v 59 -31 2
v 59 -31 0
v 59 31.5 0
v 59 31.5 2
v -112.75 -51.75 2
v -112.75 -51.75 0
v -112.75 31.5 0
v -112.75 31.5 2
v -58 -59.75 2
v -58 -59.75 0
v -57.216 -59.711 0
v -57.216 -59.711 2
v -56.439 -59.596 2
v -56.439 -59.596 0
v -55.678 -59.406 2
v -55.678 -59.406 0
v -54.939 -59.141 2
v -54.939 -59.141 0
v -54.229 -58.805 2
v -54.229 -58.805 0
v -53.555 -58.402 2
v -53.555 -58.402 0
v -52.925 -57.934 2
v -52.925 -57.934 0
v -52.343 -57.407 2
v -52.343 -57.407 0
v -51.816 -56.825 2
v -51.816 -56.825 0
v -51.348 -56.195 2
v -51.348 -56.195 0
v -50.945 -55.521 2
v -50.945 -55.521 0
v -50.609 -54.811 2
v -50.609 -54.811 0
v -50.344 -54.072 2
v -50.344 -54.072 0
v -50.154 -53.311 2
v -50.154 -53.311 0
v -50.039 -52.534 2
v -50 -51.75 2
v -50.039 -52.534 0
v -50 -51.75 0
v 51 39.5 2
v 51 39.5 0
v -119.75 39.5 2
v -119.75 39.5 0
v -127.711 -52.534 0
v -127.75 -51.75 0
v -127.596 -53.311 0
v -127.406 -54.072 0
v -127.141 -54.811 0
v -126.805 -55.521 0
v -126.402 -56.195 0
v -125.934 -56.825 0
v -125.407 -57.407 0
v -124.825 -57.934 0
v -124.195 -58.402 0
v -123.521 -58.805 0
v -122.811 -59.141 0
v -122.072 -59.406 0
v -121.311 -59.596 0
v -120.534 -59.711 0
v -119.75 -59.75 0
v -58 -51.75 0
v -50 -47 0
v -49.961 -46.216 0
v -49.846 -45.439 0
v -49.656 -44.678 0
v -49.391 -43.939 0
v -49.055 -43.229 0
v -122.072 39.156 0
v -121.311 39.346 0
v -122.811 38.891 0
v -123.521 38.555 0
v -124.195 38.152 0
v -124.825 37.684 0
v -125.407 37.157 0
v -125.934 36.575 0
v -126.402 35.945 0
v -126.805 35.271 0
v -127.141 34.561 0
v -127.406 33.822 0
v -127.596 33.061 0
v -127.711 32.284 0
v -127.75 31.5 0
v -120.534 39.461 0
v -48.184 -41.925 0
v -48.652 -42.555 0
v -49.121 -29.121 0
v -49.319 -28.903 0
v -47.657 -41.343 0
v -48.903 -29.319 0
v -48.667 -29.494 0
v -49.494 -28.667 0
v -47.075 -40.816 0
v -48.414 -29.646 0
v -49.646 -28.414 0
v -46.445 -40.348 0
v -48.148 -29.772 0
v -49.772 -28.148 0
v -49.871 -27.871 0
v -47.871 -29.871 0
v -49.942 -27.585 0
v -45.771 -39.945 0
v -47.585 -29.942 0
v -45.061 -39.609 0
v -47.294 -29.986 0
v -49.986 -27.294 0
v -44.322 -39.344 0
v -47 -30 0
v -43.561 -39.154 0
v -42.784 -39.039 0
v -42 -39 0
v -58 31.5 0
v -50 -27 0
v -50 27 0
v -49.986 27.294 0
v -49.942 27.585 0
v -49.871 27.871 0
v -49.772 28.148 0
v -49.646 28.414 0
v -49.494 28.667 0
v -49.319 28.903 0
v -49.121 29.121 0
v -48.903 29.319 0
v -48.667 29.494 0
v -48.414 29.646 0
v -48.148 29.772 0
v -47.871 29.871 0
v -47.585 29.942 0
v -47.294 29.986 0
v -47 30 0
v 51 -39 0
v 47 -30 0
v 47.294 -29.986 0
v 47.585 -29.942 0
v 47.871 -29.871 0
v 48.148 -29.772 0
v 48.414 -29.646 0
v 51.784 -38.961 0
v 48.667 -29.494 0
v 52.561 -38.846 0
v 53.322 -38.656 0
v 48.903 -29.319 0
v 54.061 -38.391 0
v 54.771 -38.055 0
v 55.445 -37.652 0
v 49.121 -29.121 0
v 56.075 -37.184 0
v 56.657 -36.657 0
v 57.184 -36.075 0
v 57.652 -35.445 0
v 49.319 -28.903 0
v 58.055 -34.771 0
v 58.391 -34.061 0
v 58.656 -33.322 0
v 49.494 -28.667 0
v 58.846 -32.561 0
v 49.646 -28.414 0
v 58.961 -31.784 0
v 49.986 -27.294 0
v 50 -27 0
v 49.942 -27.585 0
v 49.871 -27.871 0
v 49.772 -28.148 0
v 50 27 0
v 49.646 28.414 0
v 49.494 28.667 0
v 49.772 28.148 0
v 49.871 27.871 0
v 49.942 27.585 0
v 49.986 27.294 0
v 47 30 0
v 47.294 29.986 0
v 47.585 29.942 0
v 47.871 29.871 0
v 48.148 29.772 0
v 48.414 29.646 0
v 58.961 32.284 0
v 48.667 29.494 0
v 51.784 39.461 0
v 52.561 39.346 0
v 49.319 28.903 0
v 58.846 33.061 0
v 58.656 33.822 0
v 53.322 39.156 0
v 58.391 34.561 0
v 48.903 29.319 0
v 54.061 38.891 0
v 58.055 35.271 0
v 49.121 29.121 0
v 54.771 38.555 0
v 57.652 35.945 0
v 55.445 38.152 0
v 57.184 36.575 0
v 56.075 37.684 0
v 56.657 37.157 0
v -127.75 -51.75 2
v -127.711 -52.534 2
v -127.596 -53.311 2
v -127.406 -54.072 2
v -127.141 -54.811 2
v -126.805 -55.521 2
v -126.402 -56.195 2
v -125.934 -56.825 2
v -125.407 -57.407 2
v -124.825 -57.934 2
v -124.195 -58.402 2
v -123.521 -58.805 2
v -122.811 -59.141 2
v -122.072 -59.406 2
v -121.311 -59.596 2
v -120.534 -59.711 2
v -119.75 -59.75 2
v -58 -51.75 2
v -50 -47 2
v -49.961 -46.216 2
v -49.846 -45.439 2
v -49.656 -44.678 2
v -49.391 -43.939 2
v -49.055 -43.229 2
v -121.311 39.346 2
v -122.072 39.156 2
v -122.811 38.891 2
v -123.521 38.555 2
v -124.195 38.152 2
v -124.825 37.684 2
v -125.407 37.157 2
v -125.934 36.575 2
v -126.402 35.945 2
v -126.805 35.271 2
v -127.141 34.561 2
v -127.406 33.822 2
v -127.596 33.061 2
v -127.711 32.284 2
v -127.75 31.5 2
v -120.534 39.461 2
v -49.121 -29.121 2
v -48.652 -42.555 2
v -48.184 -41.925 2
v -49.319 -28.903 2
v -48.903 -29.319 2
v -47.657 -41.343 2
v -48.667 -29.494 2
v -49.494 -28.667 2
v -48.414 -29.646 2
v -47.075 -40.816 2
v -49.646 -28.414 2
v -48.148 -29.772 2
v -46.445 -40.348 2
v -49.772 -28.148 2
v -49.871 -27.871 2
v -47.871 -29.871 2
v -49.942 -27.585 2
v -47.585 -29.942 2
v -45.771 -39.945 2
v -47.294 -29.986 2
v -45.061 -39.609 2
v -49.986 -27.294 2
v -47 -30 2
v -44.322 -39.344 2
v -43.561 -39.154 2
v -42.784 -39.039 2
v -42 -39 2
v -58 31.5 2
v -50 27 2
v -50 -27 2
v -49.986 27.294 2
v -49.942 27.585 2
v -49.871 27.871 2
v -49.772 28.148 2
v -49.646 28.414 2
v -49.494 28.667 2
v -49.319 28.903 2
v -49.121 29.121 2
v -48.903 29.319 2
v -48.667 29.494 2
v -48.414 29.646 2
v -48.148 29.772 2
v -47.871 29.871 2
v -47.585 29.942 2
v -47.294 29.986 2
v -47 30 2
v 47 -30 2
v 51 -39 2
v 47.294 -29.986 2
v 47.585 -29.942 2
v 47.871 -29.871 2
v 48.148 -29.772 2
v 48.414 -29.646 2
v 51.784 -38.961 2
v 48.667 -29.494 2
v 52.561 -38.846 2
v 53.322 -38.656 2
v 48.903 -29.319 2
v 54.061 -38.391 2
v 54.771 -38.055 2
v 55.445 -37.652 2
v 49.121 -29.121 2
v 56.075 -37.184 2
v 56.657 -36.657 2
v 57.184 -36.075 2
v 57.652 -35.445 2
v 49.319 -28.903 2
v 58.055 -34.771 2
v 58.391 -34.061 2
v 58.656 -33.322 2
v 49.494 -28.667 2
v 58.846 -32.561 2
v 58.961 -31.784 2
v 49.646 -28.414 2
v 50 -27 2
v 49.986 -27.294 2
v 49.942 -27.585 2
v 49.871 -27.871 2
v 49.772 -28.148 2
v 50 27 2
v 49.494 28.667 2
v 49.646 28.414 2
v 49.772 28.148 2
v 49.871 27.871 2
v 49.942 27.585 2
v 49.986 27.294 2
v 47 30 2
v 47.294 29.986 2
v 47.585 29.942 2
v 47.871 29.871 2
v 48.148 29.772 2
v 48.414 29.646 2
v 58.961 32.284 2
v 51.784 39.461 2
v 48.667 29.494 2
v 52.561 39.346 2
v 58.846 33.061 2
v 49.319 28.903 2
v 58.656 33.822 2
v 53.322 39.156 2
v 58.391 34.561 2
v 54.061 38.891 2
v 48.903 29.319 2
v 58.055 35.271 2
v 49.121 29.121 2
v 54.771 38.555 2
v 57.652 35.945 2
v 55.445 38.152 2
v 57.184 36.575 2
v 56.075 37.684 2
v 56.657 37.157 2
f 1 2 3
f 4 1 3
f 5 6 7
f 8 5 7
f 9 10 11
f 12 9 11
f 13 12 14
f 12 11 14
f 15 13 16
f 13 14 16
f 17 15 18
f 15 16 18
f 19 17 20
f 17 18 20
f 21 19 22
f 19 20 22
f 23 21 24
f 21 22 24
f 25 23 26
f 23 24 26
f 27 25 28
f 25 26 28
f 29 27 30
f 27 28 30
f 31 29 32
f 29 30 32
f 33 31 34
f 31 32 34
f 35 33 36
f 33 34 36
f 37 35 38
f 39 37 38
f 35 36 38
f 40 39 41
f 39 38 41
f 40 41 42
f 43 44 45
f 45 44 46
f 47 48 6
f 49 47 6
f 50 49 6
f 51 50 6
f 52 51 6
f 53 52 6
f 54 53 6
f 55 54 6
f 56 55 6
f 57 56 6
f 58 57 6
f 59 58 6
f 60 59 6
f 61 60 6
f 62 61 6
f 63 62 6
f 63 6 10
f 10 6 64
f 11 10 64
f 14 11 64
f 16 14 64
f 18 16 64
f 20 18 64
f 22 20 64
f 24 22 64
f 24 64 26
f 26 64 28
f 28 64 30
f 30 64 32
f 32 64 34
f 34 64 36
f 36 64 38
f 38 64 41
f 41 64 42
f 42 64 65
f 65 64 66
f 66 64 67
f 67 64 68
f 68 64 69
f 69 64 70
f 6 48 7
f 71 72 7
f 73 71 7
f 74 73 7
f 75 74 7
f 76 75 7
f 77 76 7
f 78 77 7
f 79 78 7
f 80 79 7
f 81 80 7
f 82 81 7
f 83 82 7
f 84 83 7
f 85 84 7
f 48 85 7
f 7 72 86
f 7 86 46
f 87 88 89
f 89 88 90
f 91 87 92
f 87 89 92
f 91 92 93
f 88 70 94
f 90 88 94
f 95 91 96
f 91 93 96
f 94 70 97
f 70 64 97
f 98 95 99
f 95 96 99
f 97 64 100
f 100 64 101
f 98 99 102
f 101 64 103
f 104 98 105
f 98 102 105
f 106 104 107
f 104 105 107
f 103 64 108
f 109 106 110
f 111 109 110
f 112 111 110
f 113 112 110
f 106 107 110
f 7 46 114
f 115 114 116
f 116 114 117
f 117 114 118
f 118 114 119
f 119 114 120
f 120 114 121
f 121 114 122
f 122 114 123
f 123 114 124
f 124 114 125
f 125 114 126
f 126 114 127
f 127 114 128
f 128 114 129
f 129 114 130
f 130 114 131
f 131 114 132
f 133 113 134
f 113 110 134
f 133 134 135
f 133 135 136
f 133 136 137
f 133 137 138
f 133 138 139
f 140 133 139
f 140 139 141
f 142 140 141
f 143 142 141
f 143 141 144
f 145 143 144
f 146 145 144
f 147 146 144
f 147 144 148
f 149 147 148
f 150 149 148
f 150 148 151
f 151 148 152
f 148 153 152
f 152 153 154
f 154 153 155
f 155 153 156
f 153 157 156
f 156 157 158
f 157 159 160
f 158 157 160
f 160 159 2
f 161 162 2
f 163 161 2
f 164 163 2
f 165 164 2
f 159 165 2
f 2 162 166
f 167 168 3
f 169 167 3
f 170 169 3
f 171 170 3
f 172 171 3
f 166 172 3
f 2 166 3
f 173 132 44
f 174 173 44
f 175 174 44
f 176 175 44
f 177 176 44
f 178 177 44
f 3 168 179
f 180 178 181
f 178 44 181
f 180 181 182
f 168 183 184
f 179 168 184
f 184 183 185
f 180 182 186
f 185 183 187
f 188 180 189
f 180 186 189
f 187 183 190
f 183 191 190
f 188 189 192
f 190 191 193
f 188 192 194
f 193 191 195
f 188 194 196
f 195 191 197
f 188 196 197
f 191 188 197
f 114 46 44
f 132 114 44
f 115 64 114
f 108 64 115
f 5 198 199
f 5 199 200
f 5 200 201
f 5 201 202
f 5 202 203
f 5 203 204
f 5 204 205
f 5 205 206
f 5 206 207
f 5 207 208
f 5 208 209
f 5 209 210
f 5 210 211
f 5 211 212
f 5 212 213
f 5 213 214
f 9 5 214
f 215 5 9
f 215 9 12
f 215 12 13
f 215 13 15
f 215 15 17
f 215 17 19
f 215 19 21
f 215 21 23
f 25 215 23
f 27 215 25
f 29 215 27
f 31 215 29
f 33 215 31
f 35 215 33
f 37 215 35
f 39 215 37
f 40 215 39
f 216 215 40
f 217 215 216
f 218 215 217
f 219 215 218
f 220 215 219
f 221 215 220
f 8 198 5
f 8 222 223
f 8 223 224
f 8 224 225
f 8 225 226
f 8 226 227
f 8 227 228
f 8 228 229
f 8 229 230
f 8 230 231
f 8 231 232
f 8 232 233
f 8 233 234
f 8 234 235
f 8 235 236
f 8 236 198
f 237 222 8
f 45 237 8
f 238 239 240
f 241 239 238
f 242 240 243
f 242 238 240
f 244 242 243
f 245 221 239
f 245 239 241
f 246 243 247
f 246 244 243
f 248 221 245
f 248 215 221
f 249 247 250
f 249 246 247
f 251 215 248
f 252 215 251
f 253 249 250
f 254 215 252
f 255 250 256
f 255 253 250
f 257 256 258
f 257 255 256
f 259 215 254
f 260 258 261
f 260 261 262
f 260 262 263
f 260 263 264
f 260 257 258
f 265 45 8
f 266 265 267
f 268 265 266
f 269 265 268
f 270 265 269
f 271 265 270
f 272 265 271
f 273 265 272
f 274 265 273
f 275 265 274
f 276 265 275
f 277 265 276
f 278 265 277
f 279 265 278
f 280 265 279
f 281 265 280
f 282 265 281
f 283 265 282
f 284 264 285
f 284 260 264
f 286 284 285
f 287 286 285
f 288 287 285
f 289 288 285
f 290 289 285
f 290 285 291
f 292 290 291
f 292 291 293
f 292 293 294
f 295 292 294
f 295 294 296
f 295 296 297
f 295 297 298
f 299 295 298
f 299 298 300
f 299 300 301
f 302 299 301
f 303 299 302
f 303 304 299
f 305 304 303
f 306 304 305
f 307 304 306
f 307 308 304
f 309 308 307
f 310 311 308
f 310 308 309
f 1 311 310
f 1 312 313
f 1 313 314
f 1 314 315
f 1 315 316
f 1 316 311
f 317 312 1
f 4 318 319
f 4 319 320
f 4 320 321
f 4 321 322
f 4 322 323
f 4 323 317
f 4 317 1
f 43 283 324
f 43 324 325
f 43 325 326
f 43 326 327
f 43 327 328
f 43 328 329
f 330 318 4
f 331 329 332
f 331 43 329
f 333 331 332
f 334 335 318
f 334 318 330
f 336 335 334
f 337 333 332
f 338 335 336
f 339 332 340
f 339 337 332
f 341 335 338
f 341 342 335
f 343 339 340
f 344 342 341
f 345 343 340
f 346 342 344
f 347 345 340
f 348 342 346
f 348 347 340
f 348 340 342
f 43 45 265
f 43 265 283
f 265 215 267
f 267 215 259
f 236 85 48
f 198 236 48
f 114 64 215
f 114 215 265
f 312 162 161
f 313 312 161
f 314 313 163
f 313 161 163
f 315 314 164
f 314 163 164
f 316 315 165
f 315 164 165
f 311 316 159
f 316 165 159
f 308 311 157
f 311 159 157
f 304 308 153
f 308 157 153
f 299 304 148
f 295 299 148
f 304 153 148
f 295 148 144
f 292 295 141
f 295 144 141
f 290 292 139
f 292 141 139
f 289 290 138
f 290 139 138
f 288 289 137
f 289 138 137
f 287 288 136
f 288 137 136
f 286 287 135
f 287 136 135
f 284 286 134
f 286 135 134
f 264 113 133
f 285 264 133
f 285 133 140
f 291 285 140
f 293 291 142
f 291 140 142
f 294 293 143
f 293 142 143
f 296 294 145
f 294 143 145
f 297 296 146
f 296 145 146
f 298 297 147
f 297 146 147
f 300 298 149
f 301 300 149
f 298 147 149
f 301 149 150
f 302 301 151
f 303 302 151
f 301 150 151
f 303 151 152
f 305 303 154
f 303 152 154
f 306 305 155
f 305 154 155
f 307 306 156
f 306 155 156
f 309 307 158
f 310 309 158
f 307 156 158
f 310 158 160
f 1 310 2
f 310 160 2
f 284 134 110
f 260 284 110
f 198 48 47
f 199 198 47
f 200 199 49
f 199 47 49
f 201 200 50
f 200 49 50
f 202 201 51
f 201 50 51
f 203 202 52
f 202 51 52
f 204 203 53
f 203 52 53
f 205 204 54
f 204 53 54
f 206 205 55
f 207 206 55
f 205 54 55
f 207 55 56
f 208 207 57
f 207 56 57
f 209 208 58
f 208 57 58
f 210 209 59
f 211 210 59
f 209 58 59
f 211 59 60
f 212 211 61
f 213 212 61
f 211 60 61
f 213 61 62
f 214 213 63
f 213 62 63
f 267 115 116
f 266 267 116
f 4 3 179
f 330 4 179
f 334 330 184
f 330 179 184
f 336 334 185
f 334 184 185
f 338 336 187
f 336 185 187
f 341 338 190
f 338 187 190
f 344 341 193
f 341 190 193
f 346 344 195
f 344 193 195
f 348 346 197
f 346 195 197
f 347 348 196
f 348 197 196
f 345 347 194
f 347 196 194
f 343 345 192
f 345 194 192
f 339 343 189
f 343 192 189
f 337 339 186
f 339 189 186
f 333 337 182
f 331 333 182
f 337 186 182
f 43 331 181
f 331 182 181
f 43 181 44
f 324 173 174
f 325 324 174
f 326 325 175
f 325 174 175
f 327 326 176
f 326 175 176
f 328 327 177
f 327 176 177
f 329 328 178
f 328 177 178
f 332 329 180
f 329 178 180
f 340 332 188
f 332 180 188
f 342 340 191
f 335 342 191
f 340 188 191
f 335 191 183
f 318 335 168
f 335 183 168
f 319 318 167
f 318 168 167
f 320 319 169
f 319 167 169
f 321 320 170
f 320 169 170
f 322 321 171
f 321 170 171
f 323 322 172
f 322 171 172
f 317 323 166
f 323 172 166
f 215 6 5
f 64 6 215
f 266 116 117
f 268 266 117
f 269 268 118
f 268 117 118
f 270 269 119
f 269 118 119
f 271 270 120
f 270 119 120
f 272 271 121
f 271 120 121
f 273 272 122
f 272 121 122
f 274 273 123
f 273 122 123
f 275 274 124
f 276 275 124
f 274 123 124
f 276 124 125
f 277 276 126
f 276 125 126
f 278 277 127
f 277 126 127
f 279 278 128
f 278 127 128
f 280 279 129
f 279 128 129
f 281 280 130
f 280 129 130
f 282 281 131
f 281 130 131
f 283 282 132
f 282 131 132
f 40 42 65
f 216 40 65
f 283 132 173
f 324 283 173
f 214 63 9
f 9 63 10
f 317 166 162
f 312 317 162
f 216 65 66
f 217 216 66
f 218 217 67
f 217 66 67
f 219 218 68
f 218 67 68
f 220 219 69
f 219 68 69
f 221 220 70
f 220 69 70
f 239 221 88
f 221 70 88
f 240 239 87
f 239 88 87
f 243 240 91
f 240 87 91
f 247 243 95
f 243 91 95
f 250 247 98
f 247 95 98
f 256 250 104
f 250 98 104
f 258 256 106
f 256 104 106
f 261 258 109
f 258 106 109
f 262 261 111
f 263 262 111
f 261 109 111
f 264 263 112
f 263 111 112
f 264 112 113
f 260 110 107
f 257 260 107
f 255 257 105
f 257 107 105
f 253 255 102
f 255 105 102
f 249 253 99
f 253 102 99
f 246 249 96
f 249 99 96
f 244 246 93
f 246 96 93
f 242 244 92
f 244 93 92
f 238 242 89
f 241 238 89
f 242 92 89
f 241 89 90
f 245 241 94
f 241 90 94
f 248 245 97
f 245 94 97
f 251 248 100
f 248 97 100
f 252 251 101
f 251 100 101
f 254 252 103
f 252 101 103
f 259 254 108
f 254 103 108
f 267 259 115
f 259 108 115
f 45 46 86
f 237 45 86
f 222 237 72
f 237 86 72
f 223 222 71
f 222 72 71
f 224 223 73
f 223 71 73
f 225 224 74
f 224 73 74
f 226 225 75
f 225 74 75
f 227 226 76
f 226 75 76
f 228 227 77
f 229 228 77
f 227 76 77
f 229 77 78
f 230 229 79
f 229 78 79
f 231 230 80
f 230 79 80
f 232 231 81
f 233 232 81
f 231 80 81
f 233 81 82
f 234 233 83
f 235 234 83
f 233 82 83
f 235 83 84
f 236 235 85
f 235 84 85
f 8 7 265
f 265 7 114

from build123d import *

# Parameters (mm, degrees)
SKETCH1_W          = 54.75
SKETCH1_H          = 83.25
MAIN_EXTRUDE_DEPTH = 2


with BuildPart() as part:
    # Sketch1 → Main extrude (new body)
    with BuildSketch(Plane.XY):
        with BuildLine():
            Line((-50, -51.75), (-50, -47))
            ThreePointArc((-50, -47), (-47.656854249, -41.343145751), (-42, -39))
            Line((-42, -39), (51, -39))
            ThreePointArc((51, -39), (56.656854249, -36.656854249), (59, -31))
            Line((59, -31), (59, 31.5))
            ThreePointArc((59, 31.5), (56.656854249, 37.156854249), (51, 39.5))
            Line((51, 39.5), (-119.75, 39.5))
            ThreePointArc((-119.75, 39.5), (-125.406854249, 37.156854249), (-127.75, 31.5))
            Line((-127.75, 31.5), (-127.75, -51.75))
            ThreePointArc((-127.75, -51.75), (-125.406854249, -57.406854249), (-119.75, -59.75))
            Line((-119.75, -59.75), (-58, -59.75))
            ThreePointArc((-58, -59.75), (-52.343145751, -57.406854249), (-50, -51.75))
        make_face()
        with BuildLine():
            Line((-47, 30), (47, 30))
            ThreePointArc((47, 30), (49.121320344, 29.121320344), (50, 27))
            Line((50, 27), (50, -27))
            ThreePointArc((50, -27), (49.121320344, -29.121320344), (47, -30))
            Line((47, -30), (-47, -30))
            ThreePointArc((-47, -30), (-49.121320344, -29.121320344), (-50, -27))
            Line((-50, -27), (-50, 27))
            ThreePointArc((-50, 27), (-49.121320344, 29.121320344), (-47, 30))
        make_face(mode=Mode.SUBTRACT)
        with Locations((-85.375, -10.125)):
            Rectangle(SKETCH1_W, SKETCH1_H, mode=Mode.SUBTRACT)
    extrude(amount=MAIN_EXTRUDE_DEPTH)


solid = part.part
